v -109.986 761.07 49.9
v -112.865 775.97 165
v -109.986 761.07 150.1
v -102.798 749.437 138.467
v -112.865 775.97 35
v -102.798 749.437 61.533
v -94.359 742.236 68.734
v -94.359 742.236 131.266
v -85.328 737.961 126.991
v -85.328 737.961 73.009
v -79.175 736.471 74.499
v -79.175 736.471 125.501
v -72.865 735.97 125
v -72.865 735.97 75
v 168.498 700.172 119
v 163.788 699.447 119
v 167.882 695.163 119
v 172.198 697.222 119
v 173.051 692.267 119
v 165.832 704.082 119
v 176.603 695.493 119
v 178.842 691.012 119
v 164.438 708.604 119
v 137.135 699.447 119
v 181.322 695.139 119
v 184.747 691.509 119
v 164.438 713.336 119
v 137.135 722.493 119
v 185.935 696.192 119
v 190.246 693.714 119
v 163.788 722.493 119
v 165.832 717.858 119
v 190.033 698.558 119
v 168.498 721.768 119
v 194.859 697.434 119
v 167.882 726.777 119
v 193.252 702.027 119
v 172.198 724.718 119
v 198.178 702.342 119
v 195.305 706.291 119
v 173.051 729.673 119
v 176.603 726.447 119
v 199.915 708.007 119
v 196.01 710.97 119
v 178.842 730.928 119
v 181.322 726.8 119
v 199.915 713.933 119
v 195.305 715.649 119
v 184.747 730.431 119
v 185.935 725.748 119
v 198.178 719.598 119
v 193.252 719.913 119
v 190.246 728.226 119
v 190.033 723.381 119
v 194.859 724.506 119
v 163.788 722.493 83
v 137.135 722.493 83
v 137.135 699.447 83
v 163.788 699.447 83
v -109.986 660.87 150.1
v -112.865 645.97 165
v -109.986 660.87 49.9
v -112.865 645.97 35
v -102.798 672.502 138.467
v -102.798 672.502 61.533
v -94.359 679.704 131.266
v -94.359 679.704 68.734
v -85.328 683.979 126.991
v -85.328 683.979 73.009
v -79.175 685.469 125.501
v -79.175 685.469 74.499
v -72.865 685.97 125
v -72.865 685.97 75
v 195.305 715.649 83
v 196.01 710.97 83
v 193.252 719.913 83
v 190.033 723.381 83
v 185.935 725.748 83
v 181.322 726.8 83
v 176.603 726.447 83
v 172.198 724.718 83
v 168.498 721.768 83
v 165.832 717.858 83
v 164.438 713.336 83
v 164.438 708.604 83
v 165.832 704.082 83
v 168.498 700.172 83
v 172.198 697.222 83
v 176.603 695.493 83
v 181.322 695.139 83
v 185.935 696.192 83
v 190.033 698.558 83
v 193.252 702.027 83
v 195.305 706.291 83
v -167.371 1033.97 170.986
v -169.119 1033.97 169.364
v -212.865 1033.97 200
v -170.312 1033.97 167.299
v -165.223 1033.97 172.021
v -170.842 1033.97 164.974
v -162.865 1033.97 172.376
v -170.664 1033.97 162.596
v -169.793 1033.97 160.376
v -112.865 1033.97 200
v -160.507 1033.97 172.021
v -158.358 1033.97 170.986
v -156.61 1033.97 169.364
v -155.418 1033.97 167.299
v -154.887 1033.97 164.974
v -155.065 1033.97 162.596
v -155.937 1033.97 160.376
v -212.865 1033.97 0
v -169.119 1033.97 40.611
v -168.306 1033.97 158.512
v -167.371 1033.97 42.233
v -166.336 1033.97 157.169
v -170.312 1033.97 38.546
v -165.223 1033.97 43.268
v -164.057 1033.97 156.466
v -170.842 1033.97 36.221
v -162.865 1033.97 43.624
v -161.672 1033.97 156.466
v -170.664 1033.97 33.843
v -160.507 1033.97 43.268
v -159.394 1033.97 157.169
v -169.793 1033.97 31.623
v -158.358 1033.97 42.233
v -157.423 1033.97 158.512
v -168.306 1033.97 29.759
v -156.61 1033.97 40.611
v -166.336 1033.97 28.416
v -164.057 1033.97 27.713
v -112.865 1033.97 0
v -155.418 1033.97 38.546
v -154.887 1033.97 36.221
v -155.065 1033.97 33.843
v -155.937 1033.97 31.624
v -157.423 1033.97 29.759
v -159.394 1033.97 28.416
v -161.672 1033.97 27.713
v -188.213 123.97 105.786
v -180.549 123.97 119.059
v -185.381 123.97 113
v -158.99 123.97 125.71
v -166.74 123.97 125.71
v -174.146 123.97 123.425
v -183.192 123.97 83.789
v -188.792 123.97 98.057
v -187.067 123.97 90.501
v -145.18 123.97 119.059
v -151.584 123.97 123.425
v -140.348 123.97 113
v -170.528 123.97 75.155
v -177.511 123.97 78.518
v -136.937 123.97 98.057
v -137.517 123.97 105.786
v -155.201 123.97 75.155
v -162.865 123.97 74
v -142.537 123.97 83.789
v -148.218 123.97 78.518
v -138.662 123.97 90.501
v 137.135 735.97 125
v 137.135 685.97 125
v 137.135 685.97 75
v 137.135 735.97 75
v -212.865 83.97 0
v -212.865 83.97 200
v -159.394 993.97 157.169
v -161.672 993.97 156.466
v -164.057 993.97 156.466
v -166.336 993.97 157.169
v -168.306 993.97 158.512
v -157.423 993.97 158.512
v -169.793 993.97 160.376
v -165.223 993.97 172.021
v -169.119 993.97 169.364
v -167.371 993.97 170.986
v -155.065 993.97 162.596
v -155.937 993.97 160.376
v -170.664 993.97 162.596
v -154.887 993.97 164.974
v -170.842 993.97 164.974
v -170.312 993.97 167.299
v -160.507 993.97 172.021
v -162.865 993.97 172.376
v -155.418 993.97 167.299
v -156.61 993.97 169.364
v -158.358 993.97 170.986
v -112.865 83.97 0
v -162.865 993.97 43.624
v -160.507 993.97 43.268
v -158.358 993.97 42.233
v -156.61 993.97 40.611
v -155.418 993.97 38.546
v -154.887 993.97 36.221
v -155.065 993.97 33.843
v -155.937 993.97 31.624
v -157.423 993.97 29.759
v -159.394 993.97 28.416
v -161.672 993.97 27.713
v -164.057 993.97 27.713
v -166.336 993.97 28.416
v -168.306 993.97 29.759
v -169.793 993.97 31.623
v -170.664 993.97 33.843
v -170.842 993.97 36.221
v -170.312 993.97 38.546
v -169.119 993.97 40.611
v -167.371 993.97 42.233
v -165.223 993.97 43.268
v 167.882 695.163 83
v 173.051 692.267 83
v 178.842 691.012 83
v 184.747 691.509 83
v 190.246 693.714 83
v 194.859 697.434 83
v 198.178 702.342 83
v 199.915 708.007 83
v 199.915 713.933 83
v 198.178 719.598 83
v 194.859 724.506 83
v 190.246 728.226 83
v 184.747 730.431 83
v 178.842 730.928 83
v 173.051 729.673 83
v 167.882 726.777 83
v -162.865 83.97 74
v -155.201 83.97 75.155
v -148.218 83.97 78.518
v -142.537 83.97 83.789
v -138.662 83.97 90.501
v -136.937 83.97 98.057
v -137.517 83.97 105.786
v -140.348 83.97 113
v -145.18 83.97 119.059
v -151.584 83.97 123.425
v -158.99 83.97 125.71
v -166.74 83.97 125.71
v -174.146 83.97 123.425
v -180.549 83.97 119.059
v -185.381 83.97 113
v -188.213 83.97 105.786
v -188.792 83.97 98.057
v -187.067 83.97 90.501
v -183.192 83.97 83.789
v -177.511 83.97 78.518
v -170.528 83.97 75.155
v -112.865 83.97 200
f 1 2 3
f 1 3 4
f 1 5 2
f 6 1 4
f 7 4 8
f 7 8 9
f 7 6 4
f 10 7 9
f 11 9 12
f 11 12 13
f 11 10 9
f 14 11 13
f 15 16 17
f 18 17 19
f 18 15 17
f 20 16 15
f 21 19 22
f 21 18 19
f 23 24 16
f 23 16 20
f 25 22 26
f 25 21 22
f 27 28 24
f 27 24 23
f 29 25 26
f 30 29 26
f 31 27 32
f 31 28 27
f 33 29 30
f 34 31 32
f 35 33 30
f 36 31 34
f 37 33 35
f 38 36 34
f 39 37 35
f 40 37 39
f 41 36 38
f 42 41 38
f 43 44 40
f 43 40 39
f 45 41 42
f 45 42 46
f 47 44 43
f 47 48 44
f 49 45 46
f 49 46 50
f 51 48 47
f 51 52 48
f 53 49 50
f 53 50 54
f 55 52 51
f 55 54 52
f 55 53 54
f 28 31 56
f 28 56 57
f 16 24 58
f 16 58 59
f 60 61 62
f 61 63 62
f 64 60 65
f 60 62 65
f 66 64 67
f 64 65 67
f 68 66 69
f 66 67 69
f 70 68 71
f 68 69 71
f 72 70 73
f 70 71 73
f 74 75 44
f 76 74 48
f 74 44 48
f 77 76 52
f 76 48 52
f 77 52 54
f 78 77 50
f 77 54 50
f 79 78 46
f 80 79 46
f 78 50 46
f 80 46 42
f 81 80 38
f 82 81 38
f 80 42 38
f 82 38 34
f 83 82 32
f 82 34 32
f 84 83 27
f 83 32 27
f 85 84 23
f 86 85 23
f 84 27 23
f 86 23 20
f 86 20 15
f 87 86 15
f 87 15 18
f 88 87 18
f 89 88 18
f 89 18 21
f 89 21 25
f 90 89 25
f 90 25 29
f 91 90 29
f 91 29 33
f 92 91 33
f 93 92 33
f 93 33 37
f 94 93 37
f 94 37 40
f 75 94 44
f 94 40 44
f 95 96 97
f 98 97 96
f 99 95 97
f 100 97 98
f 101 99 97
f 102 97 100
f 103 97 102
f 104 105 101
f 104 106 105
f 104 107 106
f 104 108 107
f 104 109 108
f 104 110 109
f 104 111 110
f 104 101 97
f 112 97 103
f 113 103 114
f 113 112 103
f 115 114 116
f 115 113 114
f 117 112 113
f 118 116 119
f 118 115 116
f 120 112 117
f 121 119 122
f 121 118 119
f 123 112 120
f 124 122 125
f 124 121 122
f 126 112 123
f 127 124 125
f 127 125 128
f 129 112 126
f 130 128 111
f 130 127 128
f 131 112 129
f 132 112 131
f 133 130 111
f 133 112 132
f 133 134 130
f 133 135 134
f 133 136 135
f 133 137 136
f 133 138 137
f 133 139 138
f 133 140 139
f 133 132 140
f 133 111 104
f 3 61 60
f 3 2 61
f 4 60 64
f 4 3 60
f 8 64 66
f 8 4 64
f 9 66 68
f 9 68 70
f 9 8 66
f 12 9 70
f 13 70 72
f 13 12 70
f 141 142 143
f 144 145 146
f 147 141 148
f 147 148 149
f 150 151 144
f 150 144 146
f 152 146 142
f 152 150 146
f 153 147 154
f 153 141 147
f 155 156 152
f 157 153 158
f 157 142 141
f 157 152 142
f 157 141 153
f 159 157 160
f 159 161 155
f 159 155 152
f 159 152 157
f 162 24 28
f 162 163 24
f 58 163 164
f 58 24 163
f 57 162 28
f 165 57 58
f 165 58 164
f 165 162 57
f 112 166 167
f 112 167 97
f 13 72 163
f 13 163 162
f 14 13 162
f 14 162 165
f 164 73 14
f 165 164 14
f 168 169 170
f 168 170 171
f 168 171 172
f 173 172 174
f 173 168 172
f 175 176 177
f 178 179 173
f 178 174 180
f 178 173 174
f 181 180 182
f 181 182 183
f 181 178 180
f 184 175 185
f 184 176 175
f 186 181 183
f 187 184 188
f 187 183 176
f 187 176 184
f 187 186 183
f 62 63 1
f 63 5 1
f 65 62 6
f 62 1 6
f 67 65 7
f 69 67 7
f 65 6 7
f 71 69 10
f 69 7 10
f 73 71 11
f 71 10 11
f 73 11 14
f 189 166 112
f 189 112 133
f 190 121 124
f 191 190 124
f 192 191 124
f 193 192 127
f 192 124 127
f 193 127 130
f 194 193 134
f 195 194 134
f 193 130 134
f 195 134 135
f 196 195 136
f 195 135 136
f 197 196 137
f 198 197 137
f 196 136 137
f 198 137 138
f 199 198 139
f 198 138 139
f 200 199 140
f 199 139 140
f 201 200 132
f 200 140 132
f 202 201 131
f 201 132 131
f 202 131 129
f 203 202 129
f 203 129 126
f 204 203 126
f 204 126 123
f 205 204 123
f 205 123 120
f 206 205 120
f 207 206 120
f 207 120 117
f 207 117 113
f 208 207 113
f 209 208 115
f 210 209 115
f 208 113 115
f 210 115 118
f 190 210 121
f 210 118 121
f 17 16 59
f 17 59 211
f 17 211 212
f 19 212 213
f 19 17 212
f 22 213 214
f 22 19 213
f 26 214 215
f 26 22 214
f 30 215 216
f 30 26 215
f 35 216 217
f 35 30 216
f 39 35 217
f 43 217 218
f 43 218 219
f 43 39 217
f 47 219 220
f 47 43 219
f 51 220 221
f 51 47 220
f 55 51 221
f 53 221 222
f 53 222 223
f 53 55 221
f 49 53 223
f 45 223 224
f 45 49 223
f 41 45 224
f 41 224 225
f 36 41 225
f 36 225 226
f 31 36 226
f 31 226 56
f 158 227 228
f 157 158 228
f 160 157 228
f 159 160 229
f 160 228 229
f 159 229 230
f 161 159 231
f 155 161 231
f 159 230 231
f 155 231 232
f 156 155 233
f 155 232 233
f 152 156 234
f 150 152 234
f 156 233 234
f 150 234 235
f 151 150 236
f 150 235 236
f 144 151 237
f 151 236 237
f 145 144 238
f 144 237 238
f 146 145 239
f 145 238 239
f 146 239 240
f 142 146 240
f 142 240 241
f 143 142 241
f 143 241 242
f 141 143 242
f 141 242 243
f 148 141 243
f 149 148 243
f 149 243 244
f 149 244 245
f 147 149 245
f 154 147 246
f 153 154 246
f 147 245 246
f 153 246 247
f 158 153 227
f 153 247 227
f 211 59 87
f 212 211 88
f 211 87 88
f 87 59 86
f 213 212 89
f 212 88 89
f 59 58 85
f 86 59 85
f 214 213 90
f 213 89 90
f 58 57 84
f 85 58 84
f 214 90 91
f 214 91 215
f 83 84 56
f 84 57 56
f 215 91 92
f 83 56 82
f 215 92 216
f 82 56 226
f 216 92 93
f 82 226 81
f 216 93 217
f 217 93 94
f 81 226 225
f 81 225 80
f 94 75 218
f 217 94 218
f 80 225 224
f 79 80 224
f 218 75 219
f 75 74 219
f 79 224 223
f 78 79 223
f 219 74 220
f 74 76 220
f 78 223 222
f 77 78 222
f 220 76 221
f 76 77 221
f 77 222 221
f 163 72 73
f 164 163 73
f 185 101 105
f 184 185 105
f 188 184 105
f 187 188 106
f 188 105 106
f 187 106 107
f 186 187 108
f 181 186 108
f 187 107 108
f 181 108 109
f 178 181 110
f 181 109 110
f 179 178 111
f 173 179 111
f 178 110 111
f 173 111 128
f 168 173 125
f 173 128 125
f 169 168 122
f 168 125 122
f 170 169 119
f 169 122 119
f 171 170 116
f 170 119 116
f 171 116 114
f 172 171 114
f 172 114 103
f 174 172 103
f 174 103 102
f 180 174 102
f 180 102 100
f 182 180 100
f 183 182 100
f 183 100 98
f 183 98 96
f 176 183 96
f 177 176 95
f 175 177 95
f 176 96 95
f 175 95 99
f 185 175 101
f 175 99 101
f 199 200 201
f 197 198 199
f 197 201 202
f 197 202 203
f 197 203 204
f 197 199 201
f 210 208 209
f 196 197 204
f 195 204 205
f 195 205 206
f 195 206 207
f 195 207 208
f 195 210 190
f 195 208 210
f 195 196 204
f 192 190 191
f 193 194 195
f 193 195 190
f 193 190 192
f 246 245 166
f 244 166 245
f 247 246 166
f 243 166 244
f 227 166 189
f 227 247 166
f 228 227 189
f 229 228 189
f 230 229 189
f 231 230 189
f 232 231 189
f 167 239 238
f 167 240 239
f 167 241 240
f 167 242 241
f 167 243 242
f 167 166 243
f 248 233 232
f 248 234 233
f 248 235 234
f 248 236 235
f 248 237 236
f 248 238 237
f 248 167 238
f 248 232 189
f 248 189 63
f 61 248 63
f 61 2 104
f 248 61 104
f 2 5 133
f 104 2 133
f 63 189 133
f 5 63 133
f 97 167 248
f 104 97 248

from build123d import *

# Parameters (mm, degrees)
SKETCH1_W           = 100
SKETCH1_H           = 1100
BOSS_EXTRUDE1_DEPTH = 200
SKETCH3_W           = 50
SKETCH3_H           = 50
BOSS_EXTRUDE2_DEPTH = 250
FILLET1_R           = 40
BOSS_EXTRUDE3_START = -6
SKETCH4_R           = 15.875
BOSS_EXTRUDE3_DEPTH = 36
SKETCH5_R           = 26
CUT_EXTRUDE1_DEPTH  = 20
SKETCH6_W           = 100
SKETCH6_H           = 200
CUT_EXTRUDE2_DEPTH  = 150
SKETCH7_R           = 26
CUT_EXTRUDE3_DEPTH  = 40
CUT_EXTRUDE5_DEPTH  = 40
CUT_EXTRUDE6_DEPTH  = 40


with BuildPart() as part:
    # Sketch1 → Boss-Extrude1 (new body)
    with BuildSketch(Plane.XY):
        with Locations((-162.86470473, 483.969884115)):
            Rectangle(SKETCH1_W, SKETCH1_H)
    extrude(amount=BOSS_EXTRUDE1_DEPTH)

    # Sketch3 → Boss-Extrude2 (add)
    with BuildSketch(Plane(origin=(-112.86470473, 0, 0), x_dir=(0, 0, -1), z_dir=(1, 0, 0))):
        with Locations((-100, 710.969884115)):
            Rectangle(SKETCH3_W, SKETCH3_H)
    extrude(amount=BOSS_EXTRUDE2_DEPTH)

    # Fillet1
    fillet1_edges = [part.edges().sort_by_distance(p)[0] for p in [
        (-112.86470473, 735.969884115, 100),
        (-112.86470473, 685.969884115, 100),
        (-112.86470473, 710.969884115, 75),
        (-112.86470473, 710.969884115, 125),
    ]]
    fillet(fillet1_edges, radius=FILLET1_R)

    # Sketch4 → Boss-Extrude3 (add)
    with BuildSketch(Plane.XY.offset(125).offset(BOSS_EXTRUDE3_START)):
        with BuildLine():
            Line((137.13529527, 722.492751407), (137.13529527, 699.447016824))
            Line((137.13529527, 699.447016824), (163.788322175, 699.447016824))
            ThreePointArc((163.788322175, 699.447016824), (200.13529527, 710.969884115), (163.788322175, 722.492751407))
            Line((163.788322175, 722.492751407), (137.13529527, 722.492751407))
        make_face()
        with Locations((180.13529527, 710.969884115)):
            Circle(SKETCH4_R, mode=Mode.SUBTRACT)
    extrude(amount=-BOSS_EXTRUDE3_DEPTH)

    # Sketch5 → Cut-Extrude1 (cut)
    with BuildSketch(Plane.XZ.offset(66.030115885)):
        with Locations((-162.86470473, 100)):
            Circle(SKETCH5_R)
    extrude(amount=-CUT_EXTRUDE1_DEPTH, mode=Mode.SUBTRACT)

    # Sketch6 → Cut-Extrude2 (cut)
    with BuildSketch(Plane.XZ.offset(66.030115885)):
        with Locations((-162.86470473, 100)):
            Rectangle(SKETCH6_W, SKETCH6_H)
    extrude(amount=-CUT_EXTRUDE2_DEPTH, mode=Mode.SUBTRACT)

    # Sketch7 → Cut-Extrude3 (cut)
    with BuildSketch(Plane.XZ.offset(-83.969884115)):
        with Locations((-162.86470473, 100)):
            Circle(SKETCH7_R)
    extrude(amount=-CUT_EXTRUDE3_DEPTH, mode=Mode.SUBTRACT)

    # Sketch9 → Cut-Extrude5 (cut)
    with BuildSketch(Plane(origin=(0, 1033.969884115, 0), x_dir=(1, 0, 0), z_dir=(0, 1, 0))):
        with BuildLine():
            ThreePointArc((-154.86470473, -164.3765), (-157.20785048, -158.719645751), (-162.86470473, -156.3765))
            ThreePointArc((-162.86470473, -156.3765), (-168.521558979, -170.033354249), (-154.86470473, -164.3765))
        make_face()
    extrude(amount=-CUT_EXTRUDE5_DEPTH, mode=Mode.SUBTRACT)

    # Sketch9<4> → Cut-Extrude6 (cut)
    with BuildSketch(Plane(origin=(0, 1033.969884115, 0), x_dir=(1, 0, 0), z_dir=(0, 1, 0))):
        with BuildLine():
            ThreePointArc((-154.86470473, -35.6235), (-168.521558979, -29.966645751), (-162.86470473, -43.6235))
            ThreePointArc((-162.86470473, -43.6235), (-157.20785048, -41.280354249), (-154.86470473, -35.6235))
        make_face()
    extrude(amount=-CUT_EXTRUDE6_DEPTH, mode=Mode.SUBTRACT)


solid = part.part
